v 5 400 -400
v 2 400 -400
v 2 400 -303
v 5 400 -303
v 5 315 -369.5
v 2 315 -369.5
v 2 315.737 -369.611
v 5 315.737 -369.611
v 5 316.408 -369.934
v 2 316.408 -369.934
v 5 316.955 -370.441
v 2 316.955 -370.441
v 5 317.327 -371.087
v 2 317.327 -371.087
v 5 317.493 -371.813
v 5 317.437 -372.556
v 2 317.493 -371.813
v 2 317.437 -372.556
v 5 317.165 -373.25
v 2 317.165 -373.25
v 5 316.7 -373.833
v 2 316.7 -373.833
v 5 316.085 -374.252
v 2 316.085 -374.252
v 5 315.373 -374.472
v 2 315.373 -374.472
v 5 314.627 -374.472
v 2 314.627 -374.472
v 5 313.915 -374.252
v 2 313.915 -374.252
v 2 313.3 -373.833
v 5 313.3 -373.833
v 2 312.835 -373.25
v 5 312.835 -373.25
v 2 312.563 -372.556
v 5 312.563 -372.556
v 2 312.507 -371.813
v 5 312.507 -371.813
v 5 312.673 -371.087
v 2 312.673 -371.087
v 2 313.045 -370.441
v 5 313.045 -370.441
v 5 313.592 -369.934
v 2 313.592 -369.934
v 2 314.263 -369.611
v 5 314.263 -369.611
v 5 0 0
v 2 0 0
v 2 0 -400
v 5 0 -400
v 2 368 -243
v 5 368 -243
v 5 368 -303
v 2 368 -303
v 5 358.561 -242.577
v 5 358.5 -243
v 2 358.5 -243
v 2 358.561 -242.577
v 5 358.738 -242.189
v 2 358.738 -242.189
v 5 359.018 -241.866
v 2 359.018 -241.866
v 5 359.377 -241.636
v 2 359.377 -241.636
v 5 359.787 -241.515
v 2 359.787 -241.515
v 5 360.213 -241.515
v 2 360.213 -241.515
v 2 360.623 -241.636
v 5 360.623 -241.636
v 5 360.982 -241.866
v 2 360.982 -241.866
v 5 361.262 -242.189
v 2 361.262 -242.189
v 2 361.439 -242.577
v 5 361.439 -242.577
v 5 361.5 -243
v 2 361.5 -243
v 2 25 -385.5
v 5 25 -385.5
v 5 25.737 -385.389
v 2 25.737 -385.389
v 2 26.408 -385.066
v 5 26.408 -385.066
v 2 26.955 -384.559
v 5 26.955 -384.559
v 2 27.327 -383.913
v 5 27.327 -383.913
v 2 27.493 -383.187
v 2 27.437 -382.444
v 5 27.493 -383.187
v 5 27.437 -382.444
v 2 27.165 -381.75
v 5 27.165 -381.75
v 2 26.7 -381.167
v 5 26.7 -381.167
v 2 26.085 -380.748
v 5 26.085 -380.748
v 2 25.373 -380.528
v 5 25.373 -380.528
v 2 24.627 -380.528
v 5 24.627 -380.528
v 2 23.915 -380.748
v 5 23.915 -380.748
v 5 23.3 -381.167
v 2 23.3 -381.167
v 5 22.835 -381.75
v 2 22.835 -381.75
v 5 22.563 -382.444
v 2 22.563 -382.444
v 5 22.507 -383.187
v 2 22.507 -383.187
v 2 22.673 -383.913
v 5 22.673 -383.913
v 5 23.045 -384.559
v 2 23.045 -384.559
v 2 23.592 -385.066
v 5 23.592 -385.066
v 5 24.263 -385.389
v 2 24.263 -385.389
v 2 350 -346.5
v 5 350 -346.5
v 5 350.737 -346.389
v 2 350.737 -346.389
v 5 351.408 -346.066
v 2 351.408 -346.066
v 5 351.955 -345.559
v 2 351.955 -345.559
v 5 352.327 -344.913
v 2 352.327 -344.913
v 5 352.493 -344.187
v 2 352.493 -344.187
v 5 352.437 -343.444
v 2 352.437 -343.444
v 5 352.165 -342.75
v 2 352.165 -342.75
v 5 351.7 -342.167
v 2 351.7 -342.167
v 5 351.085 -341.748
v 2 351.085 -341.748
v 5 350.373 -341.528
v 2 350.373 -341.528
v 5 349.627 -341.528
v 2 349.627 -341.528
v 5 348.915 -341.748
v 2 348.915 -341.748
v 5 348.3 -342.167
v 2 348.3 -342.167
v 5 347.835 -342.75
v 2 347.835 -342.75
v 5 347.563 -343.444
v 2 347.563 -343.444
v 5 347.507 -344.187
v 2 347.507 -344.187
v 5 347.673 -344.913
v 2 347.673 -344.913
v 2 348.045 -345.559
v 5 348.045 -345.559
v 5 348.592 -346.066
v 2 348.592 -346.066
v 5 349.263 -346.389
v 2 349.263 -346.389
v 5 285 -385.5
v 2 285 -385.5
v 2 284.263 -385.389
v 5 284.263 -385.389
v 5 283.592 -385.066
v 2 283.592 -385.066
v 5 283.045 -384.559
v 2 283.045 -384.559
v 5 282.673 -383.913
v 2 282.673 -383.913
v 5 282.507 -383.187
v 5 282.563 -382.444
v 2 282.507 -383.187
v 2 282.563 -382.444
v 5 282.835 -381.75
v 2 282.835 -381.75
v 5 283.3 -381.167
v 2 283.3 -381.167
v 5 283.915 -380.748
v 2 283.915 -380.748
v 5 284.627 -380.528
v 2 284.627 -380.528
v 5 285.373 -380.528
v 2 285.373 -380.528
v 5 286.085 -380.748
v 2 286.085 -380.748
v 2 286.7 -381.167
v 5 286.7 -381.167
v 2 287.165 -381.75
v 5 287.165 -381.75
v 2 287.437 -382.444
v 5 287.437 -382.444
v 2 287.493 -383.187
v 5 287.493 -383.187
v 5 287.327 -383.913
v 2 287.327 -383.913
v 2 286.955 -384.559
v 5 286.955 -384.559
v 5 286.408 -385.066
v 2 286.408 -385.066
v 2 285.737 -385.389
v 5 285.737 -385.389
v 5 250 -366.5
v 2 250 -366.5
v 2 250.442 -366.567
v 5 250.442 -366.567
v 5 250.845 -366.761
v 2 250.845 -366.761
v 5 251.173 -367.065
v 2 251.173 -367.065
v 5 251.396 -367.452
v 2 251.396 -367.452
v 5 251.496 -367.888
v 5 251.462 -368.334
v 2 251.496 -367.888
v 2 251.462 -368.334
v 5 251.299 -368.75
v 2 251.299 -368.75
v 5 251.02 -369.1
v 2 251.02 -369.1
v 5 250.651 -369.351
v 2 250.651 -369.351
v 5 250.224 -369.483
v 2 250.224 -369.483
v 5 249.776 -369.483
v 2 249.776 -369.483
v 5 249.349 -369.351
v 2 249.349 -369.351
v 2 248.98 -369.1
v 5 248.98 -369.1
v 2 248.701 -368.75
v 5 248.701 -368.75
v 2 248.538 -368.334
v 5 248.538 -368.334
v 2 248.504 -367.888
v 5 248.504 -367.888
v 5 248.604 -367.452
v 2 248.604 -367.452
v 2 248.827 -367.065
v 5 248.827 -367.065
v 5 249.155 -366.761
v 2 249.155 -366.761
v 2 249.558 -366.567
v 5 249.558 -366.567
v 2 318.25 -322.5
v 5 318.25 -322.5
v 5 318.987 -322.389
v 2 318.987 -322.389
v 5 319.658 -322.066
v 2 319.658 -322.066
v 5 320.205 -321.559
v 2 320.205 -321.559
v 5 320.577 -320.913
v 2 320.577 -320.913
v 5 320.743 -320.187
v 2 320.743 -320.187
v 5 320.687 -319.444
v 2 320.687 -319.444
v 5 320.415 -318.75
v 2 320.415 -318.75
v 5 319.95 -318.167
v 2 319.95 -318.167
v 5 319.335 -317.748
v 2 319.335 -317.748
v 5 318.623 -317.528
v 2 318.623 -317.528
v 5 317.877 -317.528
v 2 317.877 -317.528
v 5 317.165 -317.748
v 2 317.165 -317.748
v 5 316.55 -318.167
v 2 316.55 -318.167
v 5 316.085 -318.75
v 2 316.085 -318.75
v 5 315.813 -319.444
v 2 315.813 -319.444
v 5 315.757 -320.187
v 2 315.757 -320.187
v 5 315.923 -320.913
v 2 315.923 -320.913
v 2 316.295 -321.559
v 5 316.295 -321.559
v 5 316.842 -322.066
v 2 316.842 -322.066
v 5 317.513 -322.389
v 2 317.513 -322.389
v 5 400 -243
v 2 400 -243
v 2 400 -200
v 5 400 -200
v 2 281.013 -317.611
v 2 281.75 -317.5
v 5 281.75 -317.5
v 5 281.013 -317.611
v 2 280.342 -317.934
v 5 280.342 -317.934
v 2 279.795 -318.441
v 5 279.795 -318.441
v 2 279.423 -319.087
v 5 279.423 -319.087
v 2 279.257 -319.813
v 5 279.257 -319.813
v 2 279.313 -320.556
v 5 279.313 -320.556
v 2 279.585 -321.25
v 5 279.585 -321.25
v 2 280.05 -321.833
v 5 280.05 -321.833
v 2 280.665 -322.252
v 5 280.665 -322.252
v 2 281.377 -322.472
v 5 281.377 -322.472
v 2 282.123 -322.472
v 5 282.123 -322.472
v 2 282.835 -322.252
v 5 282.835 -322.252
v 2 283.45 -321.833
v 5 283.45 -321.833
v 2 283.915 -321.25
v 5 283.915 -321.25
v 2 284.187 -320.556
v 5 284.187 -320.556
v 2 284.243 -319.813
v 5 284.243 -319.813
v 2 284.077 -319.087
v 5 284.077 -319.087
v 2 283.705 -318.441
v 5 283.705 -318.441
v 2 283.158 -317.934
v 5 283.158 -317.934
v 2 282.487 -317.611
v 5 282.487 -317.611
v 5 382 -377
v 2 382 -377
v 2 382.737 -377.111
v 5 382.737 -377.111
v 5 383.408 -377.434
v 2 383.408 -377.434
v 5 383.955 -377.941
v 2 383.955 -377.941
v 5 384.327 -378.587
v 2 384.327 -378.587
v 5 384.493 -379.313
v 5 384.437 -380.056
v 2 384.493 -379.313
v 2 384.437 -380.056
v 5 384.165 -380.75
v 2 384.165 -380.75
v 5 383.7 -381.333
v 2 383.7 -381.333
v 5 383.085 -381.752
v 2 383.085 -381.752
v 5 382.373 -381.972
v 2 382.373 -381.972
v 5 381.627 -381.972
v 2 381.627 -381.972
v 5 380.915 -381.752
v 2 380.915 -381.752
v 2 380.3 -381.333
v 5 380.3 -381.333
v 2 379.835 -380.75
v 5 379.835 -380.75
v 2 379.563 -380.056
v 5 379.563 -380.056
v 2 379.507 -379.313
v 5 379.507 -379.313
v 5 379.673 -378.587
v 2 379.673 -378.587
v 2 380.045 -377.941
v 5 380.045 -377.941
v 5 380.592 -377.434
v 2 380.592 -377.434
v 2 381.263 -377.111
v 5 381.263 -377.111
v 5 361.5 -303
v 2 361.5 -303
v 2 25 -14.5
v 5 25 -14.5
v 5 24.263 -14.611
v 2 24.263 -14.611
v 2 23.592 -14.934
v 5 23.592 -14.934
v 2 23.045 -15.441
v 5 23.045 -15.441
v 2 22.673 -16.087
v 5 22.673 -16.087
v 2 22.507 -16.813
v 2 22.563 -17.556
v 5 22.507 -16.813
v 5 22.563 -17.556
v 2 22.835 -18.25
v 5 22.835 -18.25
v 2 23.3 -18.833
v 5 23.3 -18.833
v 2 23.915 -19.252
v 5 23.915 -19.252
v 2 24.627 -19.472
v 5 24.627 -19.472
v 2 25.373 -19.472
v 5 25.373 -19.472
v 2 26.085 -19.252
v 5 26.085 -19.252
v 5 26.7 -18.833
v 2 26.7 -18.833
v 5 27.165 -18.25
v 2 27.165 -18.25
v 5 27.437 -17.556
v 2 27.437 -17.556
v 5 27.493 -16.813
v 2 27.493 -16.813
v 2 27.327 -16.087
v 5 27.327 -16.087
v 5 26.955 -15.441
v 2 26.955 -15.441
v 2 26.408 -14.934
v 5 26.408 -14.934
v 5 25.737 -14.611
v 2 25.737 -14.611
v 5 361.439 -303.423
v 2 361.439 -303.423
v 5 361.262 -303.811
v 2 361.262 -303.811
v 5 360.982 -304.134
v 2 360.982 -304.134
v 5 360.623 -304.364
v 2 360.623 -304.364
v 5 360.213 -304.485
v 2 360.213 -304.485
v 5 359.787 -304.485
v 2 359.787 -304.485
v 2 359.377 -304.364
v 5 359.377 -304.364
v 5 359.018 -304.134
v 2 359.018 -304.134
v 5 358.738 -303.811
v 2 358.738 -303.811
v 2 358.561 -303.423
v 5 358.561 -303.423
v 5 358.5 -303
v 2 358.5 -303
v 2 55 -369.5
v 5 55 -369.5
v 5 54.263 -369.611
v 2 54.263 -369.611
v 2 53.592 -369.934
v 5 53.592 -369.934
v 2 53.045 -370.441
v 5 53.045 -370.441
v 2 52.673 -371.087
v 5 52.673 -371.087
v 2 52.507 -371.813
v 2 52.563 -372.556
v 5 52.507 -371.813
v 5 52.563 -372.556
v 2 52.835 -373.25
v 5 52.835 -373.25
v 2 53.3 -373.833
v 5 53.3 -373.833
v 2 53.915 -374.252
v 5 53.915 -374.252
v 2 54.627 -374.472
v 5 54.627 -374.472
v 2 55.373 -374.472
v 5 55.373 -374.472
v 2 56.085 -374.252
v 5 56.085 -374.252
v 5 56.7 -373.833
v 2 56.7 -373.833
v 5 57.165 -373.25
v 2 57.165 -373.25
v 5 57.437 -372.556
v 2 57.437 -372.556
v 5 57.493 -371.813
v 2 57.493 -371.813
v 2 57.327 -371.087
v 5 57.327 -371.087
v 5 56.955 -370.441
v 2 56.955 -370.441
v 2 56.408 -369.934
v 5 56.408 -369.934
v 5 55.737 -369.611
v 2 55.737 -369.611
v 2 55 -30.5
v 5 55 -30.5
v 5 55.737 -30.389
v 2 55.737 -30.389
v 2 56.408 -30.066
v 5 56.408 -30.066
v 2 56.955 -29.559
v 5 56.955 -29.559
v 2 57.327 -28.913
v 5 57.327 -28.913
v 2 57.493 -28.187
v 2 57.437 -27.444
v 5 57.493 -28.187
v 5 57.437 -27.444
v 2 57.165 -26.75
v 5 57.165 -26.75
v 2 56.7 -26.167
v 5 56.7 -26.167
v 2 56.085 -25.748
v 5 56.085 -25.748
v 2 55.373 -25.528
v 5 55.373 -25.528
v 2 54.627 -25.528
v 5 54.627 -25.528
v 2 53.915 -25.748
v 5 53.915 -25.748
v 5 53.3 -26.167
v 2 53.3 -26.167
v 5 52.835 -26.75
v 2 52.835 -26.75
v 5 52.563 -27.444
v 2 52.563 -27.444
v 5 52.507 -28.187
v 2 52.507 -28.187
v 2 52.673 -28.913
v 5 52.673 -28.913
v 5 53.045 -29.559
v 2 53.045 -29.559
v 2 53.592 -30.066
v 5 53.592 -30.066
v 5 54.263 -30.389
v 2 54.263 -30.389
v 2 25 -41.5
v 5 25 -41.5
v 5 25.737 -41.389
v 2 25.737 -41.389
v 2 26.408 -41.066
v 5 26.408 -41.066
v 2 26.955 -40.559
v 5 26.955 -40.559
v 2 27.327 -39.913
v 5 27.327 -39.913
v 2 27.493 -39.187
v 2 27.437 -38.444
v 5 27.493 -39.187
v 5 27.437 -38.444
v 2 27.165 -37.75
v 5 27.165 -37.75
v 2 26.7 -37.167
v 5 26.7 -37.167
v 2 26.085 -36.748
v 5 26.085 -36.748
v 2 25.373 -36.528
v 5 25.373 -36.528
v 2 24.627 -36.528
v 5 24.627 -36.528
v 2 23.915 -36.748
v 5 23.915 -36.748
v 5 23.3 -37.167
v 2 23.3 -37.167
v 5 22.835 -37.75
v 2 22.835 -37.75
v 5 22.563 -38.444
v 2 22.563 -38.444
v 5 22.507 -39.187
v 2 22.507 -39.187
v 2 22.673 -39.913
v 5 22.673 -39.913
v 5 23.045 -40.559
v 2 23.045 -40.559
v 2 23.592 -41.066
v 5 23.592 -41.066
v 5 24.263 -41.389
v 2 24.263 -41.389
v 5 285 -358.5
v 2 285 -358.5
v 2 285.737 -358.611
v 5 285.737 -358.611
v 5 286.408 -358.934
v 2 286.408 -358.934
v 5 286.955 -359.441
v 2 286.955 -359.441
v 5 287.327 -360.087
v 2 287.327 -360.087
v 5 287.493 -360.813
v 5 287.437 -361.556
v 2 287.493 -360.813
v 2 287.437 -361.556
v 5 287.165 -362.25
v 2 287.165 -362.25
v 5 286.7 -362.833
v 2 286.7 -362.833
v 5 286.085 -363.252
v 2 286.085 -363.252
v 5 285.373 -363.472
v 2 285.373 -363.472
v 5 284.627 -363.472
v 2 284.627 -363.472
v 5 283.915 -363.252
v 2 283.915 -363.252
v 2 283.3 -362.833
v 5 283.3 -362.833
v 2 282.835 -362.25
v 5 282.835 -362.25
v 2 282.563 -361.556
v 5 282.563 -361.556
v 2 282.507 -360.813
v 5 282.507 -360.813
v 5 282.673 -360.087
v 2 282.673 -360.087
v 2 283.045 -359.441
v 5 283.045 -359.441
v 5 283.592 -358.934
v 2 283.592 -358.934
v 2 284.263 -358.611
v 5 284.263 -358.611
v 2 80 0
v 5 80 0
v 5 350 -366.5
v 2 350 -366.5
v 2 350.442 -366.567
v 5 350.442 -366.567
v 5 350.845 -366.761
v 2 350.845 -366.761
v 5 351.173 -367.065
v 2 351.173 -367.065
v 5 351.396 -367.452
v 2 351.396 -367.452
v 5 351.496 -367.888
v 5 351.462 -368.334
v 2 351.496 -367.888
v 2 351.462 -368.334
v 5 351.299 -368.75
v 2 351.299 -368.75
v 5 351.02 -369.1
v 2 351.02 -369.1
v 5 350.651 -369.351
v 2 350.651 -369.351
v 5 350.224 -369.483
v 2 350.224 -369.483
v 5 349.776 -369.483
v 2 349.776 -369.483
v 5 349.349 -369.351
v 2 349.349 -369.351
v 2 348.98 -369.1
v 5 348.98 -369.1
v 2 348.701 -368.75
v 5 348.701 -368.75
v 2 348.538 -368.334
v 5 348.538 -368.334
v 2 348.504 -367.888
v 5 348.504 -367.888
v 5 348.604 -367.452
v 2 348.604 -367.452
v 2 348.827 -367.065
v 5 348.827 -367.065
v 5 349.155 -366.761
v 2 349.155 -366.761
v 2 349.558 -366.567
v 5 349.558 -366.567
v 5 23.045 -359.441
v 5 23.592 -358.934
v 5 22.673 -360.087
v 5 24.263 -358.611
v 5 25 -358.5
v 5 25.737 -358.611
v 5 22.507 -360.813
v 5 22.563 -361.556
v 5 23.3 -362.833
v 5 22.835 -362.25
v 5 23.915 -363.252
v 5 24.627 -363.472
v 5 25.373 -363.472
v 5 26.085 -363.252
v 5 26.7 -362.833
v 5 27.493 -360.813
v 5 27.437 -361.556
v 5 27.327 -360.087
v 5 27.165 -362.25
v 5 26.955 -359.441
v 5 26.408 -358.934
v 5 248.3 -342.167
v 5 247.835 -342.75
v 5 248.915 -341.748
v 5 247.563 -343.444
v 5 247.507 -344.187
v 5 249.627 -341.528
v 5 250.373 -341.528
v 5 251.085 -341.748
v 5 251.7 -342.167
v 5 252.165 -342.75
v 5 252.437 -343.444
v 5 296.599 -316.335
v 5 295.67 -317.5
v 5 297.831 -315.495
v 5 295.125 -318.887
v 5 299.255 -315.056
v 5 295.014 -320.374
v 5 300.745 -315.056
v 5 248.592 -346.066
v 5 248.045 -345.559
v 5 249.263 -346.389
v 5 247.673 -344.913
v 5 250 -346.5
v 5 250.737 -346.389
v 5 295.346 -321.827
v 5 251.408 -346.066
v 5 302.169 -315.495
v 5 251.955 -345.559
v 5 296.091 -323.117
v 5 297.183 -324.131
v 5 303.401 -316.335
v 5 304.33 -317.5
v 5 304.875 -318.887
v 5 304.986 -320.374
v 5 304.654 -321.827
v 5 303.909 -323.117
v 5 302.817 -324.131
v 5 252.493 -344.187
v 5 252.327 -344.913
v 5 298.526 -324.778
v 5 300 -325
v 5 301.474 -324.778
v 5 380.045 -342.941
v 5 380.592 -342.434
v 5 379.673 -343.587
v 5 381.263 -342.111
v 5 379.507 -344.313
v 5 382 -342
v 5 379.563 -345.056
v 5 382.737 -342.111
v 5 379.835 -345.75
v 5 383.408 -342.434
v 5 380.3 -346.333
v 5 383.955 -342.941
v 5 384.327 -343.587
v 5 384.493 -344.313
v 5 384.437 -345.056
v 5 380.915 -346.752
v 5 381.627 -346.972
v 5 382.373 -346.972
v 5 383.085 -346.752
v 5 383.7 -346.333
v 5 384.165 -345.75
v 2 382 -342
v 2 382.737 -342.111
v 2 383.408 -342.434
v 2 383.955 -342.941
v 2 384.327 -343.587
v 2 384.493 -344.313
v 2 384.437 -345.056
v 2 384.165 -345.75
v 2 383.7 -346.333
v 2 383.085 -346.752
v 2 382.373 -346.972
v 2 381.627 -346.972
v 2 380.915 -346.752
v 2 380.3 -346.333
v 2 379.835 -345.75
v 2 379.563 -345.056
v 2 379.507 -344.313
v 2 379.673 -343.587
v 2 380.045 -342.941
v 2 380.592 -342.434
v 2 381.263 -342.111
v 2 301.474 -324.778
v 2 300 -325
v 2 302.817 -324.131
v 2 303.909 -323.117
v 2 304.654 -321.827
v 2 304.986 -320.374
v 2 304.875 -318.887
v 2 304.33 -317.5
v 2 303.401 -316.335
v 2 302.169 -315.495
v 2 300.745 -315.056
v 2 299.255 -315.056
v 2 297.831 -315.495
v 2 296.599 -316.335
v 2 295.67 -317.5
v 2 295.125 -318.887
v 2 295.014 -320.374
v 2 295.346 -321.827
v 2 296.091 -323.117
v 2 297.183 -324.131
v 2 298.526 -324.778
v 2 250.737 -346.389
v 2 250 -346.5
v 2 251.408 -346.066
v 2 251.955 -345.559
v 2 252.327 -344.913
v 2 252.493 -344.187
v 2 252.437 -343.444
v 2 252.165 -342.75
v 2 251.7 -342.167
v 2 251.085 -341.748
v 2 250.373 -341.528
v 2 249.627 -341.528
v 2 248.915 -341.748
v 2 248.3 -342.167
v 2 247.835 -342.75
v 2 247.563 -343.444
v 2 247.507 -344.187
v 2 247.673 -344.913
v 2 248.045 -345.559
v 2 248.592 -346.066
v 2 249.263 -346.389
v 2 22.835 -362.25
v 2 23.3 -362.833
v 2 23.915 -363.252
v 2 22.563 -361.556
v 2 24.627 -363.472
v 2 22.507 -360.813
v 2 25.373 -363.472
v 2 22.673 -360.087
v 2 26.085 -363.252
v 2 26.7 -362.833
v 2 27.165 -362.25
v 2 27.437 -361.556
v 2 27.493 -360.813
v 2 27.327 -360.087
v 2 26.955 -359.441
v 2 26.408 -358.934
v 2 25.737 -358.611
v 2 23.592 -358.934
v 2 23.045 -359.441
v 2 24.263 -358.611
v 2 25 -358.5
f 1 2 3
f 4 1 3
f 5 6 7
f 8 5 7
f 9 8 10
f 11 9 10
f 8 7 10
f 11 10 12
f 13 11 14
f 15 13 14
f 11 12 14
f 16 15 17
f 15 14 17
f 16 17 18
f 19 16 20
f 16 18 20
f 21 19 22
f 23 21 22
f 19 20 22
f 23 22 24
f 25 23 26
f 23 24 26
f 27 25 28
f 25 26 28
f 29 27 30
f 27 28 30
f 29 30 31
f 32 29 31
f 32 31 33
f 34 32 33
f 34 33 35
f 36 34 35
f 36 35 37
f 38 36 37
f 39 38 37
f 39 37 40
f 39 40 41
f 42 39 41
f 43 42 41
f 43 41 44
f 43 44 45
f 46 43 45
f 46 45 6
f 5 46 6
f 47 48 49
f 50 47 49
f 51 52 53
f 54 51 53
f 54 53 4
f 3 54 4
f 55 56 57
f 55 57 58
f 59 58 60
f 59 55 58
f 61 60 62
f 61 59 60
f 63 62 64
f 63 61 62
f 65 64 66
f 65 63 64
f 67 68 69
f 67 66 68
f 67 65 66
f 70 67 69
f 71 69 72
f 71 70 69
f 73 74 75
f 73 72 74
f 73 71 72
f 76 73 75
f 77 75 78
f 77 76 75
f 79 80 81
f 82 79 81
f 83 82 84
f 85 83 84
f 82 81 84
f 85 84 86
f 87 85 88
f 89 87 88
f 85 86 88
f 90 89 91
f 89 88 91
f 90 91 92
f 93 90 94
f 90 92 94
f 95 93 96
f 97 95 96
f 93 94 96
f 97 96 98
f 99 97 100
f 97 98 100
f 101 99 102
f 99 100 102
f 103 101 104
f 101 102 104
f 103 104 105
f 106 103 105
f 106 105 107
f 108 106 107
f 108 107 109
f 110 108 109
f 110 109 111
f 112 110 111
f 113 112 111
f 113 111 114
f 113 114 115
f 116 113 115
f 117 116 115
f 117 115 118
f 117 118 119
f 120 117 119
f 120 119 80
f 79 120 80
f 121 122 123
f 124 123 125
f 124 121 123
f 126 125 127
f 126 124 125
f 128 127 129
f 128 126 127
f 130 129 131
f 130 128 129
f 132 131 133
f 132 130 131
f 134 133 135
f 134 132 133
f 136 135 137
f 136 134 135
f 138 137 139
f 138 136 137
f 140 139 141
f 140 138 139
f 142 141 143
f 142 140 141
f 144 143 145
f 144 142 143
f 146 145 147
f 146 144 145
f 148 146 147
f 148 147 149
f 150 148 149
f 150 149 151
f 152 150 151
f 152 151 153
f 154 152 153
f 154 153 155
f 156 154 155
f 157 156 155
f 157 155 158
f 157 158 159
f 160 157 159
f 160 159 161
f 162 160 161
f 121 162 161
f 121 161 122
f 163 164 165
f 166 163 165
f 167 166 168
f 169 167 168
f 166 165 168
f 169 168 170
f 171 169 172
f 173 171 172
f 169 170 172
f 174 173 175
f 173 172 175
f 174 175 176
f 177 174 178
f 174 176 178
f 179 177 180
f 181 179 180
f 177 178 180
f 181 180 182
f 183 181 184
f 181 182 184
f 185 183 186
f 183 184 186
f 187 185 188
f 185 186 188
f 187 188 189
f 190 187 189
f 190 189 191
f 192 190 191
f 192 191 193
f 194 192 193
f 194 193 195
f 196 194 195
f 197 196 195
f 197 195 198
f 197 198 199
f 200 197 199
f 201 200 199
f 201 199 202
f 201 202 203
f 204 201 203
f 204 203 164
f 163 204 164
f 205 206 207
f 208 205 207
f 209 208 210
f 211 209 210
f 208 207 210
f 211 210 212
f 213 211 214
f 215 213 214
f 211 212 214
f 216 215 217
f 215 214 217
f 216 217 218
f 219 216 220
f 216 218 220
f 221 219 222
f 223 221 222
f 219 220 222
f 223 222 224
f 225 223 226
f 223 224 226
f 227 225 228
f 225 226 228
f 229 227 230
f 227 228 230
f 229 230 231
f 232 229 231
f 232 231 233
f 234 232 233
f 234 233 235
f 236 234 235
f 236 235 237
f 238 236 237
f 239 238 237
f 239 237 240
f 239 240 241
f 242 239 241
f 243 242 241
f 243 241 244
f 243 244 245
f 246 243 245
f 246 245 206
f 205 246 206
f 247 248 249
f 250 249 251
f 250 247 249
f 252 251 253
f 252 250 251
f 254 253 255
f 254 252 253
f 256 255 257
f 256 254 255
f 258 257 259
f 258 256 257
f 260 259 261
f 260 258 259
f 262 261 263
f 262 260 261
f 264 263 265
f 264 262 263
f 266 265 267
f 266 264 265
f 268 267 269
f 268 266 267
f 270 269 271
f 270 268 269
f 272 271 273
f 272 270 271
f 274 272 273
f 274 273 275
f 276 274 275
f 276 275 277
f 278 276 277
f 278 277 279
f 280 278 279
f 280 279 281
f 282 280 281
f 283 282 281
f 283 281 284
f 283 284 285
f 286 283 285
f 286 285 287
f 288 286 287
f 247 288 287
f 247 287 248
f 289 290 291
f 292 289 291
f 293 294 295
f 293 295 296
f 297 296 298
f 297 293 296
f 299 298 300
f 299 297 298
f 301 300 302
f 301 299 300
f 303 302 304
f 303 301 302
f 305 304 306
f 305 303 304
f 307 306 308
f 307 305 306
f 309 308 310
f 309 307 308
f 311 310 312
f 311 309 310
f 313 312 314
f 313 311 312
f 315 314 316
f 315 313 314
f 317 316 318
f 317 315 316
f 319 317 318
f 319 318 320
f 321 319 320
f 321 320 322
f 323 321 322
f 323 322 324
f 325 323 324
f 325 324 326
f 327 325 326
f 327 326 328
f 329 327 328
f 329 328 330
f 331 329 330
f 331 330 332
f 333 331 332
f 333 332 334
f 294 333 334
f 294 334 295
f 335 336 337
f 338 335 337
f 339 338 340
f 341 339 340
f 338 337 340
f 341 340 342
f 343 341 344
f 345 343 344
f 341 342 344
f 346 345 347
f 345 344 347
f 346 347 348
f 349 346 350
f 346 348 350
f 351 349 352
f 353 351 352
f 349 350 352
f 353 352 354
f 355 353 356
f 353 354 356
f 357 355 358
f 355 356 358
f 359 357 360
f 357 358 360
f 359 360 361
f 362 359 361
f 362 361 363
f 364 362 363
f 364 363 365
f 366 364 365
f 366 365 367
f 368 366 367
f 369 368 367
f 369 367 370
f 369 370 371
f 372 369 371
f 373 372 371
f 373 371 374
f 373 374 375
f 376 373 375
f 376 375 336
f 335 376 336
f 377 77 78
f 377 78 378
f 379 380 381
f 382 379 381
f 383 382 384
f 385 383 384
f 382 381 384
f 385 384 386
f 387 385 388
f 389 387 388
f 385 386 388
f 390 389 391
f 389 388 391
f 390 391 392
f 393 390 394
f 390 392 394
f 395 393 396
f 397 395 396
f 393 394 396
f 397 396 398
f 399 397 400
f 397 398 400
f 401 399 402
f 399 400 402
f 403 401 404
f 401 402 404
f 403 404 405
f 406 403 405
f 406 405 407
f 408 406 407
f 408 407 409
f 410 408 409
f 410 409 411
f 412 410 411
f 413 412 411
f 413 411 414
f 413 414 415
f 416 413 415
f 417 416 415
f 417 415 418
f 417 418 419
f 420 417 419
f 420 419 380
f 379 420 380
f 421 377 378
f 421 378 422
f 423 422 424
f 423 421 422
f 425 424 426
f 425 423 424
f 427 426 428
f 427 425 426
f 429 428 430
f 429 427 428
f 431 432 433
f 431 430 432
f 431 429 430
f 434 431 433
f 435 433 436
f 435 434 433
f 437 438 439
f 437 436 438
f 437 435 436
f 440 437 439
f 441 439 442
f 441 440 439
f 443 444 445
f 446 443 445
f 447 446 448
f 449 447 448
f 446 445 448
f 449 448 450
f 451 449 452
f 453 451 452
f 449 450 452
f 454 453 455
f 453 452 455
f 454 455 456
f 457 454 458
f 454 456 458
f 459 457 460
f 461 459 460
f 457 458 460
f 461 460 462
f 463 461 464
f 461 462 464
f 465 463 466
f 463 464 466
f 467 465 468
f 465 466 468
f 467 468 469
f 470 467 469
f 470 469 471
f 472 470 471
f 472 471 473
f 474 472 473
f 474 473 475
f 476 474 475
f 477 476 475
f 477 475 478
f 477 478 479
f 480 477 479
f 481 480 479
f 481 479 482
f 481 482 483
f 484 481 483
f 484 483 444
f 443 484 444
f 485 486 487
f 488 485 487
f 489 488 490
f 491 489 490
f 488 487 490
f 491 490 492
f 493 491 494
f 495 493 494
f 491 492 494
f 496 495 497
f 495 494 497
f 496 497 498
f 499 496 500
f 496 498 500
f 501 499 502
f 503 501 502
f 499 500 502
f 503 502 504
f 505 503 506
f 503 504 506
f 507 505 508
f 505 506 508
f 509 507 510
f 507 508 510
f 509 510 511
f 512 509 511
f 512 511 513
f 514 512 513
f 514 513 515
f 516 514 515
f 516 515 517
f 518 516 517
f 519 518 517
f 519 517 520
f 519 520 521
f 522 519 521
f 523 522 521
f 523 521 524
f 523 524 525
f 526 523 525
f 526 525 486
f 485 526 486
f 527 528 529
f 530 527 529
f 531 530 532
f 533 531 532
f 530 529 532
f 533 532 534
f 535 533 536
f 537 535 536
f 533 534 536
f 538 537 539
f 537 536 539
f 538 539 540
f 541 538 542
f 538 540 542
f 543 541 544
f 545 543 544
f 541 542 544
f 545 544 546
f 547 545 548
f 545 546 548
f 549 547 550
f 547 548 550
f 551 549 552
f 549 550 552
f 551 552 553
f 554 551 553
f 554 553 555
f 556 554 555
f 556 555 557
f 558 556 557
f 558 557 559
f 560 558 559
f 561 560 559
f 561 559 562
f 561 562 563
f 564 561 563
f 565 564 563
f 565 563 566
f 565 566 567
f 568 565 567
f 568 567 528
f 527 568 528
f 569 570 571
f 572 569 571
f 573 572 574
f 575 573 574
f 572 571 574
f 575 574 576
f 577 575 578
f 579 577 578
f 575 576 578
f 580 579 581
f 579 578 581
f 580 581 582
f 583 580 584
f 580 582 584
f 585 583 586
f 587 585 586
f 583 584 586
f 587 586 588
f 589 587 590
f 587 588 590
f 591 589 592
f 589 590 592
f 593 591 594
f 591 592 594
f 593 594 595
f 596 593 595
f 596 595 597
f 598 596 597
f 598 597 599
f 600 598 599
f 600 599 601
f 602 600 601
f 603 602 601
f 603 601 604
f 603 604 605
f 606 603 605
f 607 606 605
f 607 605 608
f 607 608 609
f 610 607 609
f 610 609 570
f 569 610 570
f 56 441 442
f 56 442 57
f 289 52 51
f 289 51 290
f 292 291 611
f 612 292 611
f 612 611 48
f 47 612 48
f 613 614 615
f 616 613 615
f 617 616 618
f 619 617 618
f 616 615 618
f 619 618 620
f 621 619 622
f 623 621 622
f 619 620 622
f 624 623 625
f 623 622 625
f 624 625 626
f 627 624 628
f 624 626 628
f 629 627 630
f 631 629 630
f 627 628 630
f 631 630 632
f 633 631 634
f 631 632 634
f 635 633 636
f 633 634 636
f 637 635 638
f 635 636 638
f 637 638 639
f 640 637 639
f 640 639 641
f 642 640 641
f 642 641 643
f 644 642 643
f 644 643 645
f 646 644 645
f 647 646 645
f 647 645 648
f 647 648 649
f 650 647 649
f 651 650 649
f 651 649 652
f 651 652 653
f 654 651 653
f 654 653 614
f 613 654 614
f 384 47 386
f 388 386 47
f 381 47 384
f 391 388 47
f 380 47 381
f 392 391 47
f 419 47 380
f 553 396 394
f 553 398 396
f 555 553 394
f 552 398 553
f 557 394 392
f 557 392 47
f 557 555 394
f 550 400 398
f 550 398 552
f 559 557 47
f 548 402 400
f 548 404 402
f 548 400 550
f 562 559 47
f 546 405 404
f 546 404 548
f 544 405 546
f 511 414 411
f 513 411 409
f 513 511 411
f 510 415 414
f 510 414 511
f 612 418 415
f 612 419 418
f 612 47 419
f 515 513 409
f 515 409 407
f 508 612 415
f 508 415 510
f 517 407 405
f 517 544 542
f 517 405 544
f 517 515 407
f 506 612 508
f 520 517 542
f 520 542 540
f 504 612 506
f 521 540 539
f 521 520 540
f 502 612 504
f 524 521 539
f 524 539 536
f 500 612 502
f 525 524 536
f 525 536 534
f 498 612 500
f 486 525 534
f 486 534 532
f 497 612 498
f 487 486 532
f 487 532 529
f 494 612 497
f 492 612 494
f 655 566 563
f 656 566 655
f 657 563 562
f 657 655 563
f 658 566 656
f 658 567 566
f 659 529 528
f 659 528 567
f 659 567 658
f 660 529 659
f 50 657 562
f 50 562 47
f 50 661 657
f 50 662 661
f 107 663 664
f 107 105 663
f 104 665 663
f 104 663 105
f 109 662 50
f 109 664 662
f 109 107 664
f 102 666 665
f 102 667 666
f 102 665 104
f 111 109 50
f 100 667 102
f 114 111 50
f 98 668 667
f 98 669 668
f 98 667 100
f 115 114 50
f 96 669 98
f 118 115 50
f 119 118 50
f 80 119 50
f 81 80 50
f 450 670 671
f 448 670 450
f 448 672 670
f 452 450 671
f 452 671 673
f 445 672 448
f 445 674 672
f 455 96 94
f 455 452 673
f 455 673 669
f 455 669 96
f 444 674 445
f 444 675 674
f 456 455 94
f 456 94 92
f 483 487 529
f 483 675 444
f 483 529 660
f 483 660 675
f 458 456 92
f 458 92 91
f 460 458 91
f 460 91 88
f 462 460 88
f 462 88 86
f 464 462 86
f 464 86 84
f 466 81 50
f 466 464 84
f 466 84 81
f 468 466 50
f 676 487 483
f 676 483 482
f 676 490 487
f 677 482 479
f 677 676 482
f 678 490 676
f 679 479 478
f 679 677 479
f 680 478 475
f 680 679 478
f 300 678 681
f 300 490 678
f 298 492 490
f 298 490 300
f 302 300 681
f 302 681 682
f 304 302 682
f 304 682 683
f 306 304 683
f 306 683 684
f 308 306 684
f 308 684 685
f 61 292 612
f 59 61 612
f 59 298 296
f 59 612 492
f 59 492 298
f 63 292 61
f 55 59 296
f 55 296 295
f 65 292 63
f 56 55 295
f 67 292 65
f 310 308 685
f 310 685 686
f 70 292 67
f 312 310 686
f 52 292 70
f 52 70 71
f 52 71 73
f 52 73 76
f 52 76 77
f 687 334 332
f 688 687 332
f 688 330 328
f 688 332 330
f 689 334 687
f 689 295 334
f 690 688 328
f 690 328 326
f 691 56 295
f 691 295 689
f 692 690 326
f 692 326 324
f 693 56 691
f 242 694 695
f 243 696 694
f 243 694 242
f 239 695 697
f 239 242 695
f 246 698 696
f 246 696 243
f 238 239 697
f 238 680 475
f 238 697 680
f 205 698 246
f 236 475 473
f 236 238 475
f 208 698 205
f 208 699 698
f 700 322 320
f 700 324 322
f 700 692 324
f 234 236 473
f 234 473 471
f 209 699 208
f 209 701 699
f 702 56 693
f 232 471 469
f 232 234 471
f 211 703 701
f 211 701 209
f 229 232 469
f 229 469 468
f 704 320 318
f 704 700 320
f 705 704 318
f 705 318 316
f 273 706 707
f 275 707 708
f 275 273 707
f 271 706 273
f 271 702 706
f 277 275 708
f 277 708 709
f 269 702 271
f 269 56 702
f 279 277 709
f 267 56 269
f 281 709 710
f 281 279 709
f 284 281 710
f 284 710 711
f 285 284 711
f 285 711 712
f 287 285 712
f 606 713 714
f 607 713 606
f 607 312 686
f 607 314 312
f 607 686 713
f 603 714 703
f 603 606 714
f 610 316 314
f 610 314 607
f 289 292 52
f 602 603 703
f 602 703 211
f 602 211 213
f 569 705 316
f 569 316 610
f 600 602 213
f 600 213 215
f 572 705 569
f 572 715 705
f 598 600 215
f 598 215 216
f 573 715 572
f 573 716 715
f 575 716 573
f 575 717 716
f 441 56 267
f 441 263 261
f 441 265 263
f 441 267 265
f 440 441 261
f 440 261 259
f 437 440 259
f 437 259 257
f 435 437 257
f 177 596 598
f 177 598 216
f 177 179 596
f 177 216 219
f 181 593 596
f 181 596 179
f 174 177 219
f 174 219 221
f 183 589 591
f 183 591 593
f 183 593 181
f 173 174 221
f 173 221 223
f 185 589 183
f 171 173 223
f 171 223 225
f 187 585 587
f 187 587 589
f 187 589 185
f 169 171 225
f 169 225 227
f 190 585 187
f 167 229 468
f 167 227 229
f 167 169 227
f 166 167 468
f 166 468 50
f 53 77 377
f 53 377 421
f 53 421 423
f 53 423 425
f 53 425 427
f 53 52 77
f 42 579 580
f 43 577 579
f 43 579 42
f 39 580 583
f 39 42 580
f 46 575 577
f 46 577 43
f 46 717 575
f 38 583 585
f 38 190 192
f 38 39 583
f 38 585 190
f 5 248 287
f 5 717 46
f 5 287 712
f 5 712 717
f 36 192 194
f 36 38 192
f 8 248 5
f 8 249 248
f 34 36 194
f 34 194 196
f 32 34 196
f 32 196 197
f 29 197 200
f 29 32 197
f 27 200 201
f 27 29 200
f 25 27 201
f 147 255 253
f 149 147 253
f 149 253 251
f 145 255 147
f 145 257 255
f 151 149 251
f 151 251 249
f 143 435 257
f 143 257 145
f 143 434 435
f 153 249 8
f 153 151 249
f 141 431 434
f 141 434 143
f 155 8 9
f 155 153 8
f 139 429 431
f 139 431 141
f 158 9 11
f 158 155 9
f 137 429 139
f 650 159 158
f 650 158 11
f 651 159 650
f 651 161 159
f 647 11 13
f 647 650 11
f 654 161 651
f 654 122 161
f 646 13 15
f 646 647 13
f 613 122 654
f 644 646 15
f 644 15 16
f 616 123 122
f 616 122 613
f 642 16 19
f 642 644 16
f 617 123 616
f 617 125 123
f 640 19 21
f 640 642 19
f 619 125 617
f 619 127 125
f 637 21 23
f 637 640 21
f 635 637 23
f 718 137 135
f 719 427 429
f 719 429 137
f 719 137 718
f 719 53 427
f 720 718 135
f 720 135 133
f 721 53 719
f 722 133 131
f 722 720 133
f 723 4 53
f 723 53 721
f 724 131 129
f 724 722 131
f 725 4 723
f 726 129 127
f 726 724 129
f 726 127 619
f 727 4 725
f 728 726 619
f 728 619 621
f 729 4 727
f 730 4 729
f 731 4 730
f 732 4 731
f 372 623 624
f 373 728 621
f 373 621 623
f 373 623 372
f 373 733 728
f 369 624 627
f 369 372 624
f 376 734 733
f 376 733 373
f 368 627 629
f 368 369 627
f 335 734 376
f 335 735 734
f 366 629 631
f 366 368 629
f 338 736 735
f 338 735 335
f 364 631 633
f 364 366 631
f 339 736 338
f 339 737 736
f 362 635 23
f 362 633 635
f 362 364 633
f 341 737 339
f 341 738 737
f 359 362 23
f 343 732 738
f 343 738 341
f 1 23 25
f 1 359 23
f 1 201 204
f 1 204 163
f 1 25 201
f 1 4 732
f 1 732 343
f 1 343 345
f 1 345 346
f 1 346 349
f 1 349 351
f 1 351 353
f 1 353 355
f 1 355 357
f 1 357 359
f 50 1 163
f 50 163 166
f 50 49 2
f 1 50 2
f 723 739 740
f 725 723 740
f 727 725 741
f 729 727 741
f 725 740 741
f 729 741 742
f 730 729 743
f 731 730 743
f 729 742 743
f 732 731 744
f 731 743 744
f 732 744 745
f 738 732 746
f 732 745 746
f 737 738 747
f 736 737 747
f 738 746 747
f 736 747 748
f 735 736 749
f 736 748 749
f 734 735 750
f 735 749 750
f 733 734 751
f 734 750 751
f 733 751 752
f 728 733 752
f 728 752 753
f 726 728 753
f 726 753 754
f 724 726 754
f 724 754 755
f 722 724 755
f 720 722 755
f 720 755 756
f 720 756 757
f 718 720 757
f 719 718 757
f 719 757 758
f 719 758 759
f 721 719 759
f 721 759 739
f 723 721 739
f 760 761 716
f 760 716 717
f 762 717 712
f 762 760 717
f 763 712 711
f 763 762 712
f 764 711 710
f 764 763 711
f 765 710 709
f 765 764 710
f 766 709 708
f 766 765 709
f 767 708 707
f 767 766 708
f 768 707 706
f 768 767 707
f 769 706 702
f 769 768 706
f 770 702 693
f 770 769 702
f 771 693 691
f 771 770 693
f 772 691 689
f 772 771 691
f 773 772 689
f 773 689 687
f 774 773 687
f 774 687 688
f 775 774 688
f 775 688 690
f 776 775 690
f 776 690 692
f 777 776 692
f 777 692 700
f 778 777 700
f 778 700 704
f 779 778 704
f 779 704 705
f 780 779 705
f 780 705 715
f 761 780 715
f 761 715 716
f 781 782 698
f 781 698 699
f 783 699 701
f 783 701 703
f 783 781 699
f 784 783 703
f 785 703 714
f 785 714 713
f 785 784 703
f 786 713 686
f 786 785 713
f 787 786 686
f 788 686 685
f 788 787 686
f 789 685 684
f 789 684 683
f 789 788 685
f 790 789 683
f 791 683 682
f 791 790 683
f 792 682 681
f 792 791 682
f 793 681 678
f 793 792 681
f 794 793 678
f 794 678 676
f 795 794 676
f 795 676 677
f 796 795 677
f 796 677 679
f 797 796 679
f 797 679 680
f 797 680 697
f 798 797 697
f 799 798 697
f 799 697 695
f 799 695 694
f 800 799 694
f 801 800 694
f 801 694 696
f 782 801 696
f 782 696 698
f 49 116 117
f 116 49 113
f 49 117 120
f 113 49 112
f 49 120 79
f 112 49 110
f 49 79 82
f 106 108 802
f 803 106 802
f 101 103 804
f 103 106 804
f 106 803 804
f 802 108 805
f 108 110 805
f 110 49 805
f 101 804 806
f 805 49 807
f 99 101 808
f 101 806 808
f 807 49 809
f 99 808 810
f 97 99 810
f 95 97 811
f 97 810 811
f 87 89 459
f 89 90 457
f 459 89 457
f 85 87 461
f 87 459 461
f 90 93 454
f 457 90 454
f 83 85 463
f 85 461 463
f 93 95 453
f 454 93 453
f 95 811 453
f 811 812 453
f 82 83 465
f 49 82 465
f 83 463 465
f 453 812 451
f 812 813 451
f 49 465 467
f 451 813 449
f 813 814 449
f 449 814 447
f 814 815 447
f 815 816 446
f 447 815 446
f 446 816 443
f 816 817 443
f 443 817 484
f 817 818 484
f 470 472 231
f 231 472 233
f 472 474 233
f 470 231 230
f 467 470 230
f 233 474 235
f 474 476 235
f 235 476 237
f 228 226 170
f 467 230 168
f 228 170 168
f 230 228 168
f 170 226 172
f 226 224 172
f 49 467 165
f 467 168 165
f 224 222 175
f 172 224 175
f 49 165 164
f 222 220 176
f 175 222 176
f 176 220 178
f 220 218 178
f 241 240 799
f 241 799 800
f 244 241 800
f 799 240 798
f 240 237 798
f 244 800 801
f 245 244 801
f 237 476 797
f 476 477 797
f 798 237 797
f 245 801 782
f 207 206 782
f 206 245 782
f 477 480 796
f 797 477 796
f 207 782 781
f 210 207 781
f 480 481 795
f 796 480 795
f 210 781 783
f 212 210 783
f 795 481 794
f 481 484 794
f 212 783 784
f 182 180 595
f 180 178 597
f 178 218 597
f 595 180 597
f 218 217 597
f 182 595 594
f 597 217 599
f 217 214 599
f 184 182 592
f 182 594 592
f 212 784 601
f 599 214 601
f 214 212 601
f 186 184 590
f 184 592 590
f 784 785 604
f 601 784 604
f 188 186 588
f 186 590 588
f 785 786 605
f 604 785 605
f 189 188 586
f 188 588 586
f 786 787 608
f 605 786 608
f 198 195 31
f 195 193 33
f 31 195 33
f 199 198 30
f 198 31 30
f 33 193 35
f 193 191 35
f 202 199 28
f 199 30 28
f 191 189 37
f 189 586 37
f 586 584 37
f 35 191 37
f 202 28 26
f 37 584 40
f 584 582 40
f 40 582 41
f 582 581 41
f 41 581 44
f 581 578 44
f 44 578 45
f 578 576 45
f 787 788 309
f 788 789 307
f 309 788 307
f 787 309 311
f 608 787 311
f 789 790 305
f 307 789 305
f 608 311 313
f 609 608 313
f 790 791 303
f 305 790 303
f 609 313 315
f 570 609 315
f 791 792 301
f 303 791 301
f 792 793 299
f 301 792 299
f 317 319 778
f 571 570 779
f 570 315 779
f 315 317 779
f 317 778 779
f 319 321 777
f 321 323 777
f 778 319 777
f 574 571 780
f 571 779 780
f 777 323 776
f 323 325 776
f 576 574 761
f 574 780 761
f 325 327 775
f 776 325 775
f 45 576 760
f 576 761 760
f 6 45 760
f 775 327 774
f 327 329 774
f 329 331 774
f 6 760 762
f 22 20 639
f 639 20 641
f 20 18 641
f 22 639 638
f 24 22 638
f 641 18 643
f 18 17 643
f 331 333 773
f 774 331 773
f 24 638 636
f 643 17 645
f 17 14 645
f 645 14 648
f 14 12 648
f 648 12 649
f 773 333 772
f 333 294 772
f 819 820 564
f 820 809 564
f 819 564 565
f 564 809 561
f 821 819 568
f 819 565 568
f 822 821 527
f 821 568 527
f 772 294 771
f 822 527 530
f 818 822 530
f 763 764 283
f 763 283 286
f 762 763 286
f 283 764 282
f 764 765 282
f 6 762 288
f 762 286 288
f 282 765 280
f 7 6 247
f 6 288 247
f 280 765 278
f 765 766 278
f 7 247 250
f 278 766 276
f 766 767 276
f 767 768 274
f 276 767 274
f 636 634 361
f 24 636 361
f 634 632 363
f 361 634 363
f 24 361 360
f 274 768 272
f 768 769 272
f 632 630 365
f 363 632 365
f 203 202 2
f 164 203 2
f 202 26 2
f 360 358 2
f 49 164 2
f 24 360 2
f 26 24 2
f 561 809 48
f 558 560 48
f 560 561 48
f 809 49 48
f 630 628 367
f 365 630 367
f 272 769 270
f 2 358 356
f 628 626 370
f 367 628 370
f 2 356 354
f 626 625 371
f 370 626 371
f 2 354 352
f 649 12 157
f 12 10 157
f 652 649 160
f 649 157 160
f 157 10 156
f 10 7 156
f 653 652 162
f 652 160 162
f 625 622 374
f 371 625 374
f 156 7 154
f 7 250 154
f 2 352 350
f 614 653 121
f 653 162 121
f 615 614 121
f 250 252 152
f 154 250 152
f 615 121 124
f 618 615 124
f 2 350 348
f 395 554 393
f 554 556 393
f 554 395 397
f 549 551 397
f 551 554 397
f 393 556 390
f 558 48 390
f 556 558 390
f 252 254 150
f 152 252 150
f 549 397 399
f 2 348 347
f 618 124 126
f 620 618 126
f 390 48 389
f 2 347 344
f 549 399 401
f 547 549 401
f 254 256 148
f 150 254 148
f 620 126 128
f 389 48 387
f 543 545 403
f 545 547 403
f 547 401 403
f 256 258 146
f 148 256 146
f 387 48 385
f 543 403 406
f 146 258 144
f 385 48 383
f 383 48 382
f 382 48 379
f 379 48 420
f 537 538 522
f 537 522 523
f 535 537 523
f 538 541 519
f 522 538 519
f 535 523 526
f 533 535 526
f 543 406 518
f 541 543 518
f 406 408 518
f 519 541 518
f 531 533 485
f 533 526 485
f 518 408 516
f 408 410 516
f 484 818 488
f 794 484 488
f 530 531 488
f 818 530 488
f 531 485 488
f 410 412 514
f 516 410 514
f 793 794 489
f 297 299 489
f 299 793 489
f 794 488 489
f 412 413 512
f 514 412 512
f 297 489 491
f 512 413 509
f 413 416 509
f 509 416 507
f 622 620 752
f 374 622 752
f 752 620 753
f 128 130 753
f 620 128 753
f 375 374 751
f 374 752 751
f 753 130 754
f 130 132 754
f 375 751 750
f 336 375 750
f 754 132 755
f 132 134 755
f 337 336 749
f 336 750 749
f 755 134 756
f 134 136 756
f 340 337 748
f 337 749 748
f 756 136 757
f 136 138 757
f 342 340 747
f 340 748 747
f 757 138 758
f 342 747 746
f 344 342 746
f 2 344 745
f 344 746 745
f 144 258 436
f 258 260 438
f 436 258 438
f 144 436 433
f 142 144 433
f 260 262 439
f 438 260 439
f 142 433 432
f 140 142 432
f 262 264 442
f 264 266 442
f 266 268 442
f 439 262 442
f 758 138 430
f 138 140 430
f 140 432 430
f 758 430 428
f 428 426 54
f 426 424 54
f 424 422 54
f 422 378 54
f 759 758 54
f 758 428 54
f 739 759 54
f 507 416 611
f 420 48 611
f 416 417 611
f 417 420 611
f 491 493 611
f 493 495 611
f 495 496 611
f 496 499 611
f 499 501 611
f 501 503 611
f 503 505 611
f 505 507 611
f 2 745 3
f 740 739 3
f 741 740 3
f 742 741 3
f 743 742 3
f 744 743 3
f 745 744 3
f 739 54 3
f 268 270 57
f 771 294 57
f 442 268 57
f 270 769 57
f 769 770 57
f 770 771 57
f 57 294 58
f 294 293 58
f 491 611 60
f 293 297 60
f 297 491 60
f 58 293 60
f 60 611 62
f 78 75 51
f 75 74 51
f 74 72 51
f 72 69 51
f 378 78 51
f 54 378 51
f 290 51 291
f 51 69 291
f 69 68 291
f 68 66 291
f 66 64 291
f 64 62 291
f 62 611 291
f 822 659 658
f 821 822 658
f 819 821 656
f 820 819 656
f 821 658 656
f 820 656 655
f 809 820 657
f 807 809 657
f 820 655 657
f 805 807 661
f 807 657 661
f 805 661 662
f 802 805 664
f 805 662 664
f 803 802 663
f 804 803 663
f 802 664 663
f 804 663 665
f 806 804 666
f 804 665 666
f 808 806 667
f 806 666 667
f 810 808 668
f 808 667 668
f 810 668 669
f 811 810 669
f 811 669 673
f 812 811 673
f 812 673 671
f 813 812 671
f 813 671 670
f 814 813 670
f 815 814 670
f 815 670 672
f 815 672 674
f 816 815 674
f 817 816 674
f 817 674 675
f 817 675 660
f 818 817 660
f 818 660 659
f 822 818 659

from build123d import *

# Parameters (mm, degrees)
SKETCH1_R                  = 2.5
SKETCH1_R_2                = 5
BOSS_EXTRUDE1_DEPTH        = 5
CONVERT_SOLID1_OUTLINE_R   = 2.5
CONVERT_SOLID1_OUTLINE_R_2 = 5
CONVERT_SOLID1_DEPTH       = 2
SKETCH6_R                  = 2.5
CUT_EXTRUDE1_DEPTH         = 10
SKETCH7_R                  = 2.5
CUT_EXTRUDE2_DEPTH         = 10
SKETCH8_R                  = 2.5
CUT_EXTRUDE3_DEPTH         = 10
SKETCH9_R                  = 1.5
CUT_EXTRUDE4_DEPTH         = 10
SKETCH10_W                 = 60
SKETCH10_H                 = 32
CUT_EXTRUDE5_DEPTH         = 10


# Read off the part's stored shape, not the designer's step: Convert-Solid1
with BuildPart() as part:
    # Sketch1 → Boss-Extrude1 (new body)
    with BuildSketch(Plane(origin=(0, 0, 0), x_dir=(0, 0, -1), z_dir=(1, 0, 0))):
        Polygon((0, 0), (400, 0), (400, 400), (200, 400), (0, 80), align=None)
        with Locations((344, 350)):
            Circle(SKETCH1_R, mode=Mode.SUBTRACT)
        with Locations((344, 250)):
            Circle(SKETCH1_R, mode=Mode.SUBTRACT)
        with Locations((320, 300)):
            Circle(SKETCH1_R_2, mode=Mode.SUBTRACT)
        with Locations((320, 318.25)):
            Circle(SKETCH1_R, mode=Mode.SUBTRACT)
        with Locations(Location((320, 281.75, 0), (0, 0, 180))):
            Circle(SKETCH1_R, mode=Mode.SUBTRACT)
    extrude(amount=BOSS_EXTRUDE1_DEPTH)

    # Convert-Solid1 outline → Convert-Solid1 (cut)
    with BuildSketch(Plane.YZ):
        Polygon((80, 0), (0, 0), (0, -400), (400, -400), (400, -200), align=None)
        with Locations((250, -344)):
            Circle(CONVERT_SOLID1_OUTLINE_R, mode=Mode.SUBTRACT)
        with Locations((281.75, -320)):
            Circle(CONVERT_SOLID1_OUTLINE_R, mode=Mode.SUBTRACT)
        with Locations((300, -320)):
            Circle(CONVERT_SOLID1_OUTLINE_R_2, mode=Mode.SUBTRACT)
        with Locations((350, -344)):
            Circle(CONVERT_SOLID1_OUTLINE_R, mode=Mode.SUBTRACT)
        with Locations((318.25, -320)):
            Circle(CONVERT_SOLID1_OUTLINE_R, mode=Mode.SUBTRACT)
    extrude(amount=CONVERT_SOLID1_DEPTH, mode=Mode.SUBTRACT)

    # Sketch6 → Cut-Extrude1 (cut)
    with BuildSketch(Plane(origin=(5, 0, 0), x_dir=(0, 0, -1), z_dir=(1, 0, 0))):
        with Locations((28, 55)):
            Circle(SKETCH6_R)
        with Locations((39, 25)):
            Circle(SKETCH6_R)
        with Locations(Location((17, 25, 0), (0, 0, 180))):
            Circle(SKETCH6_R)
        with Locations((383, 25)):
            Circle(SKETCH6_R)
        with Locations(Location((361, 25, 0), (0, 0, 180))):
            Circle(SKETCH6_R)
        with Locations(Location((372, 55, 0), (0, 0, 180))):
            Circle(SKETCH6_R)
    extrude(amount=-CUT_EXTRUDE1_DEPTH, mode=Mode.SUBTRACT)

    # Sketch7 → Cut-Extrude2 (cut)
    with BuildSketch(Plane.ZY.offset(-2)):
        with Locations((-372, 315)):
            Circle(SKETCH7_R)
        with Locations((-361, 285)):
            Circle(SKETCH7_R)
        with Locations(Location((-383, 285, 0), (0, 0, 180))):
            Circle(SKETCH7_R)
    extrude(amount=-CUT_EXTRUDE2_DEPTH, mode=Mode.SUBTRACT)

    # Sketch8 → Cut-Extrude3 (cut)
    with BuildSketch(Plane.ZY.offset(-2)):
        with Locations((-344.5, 382)):
            Circle(SKETCH8_R)
        with Locations((-379.5, 382)):
            Circle(SKETCH8_R)
    extrude(amount=-CUT_EXTRUDE3_DEPTH, mode=Mode.SUBTRACT)

    # Sketch9 → Cut-Extrude4 (cut)
    with BuildSketch(Plane.ZY.offset(-2)):
        with Locations((-368, 350)):
            Circle(SKETCH9_R)
        with Locations((-368, 250)):
            Circle(SKETCH9_R)
    extrude(amount=-CUT_EXTRUDE4_DEPTH, mode=Mode.SUBTRACT)

    # Sketch10 → Cut-Extrude5 (cut)
    with BuildSketch(Plane(origin=(5, 0, 0), x_dir=(0, 0, -1), z_dir=(1, 0, 0))):
        with Locations((273, 384)):
            Rectangle(SKETCH10_W, SKETCH10_H)
        with BuildLine():
            Line((243, 361.5), (303, 361.5))
            ThreePointArc((303, 361.5), (304.5, 360), (303, 358.5))
            Line((303, 358.5), (243, 358.5))
            ThreePointArc((243, 358.5), (241.5, 360), (243, 361.5))
        make_face()
    extrude(amount=-CUT_EXTRUDE5_DEPTH, mode=Mode.SUBTRACT)


solid = part.part
